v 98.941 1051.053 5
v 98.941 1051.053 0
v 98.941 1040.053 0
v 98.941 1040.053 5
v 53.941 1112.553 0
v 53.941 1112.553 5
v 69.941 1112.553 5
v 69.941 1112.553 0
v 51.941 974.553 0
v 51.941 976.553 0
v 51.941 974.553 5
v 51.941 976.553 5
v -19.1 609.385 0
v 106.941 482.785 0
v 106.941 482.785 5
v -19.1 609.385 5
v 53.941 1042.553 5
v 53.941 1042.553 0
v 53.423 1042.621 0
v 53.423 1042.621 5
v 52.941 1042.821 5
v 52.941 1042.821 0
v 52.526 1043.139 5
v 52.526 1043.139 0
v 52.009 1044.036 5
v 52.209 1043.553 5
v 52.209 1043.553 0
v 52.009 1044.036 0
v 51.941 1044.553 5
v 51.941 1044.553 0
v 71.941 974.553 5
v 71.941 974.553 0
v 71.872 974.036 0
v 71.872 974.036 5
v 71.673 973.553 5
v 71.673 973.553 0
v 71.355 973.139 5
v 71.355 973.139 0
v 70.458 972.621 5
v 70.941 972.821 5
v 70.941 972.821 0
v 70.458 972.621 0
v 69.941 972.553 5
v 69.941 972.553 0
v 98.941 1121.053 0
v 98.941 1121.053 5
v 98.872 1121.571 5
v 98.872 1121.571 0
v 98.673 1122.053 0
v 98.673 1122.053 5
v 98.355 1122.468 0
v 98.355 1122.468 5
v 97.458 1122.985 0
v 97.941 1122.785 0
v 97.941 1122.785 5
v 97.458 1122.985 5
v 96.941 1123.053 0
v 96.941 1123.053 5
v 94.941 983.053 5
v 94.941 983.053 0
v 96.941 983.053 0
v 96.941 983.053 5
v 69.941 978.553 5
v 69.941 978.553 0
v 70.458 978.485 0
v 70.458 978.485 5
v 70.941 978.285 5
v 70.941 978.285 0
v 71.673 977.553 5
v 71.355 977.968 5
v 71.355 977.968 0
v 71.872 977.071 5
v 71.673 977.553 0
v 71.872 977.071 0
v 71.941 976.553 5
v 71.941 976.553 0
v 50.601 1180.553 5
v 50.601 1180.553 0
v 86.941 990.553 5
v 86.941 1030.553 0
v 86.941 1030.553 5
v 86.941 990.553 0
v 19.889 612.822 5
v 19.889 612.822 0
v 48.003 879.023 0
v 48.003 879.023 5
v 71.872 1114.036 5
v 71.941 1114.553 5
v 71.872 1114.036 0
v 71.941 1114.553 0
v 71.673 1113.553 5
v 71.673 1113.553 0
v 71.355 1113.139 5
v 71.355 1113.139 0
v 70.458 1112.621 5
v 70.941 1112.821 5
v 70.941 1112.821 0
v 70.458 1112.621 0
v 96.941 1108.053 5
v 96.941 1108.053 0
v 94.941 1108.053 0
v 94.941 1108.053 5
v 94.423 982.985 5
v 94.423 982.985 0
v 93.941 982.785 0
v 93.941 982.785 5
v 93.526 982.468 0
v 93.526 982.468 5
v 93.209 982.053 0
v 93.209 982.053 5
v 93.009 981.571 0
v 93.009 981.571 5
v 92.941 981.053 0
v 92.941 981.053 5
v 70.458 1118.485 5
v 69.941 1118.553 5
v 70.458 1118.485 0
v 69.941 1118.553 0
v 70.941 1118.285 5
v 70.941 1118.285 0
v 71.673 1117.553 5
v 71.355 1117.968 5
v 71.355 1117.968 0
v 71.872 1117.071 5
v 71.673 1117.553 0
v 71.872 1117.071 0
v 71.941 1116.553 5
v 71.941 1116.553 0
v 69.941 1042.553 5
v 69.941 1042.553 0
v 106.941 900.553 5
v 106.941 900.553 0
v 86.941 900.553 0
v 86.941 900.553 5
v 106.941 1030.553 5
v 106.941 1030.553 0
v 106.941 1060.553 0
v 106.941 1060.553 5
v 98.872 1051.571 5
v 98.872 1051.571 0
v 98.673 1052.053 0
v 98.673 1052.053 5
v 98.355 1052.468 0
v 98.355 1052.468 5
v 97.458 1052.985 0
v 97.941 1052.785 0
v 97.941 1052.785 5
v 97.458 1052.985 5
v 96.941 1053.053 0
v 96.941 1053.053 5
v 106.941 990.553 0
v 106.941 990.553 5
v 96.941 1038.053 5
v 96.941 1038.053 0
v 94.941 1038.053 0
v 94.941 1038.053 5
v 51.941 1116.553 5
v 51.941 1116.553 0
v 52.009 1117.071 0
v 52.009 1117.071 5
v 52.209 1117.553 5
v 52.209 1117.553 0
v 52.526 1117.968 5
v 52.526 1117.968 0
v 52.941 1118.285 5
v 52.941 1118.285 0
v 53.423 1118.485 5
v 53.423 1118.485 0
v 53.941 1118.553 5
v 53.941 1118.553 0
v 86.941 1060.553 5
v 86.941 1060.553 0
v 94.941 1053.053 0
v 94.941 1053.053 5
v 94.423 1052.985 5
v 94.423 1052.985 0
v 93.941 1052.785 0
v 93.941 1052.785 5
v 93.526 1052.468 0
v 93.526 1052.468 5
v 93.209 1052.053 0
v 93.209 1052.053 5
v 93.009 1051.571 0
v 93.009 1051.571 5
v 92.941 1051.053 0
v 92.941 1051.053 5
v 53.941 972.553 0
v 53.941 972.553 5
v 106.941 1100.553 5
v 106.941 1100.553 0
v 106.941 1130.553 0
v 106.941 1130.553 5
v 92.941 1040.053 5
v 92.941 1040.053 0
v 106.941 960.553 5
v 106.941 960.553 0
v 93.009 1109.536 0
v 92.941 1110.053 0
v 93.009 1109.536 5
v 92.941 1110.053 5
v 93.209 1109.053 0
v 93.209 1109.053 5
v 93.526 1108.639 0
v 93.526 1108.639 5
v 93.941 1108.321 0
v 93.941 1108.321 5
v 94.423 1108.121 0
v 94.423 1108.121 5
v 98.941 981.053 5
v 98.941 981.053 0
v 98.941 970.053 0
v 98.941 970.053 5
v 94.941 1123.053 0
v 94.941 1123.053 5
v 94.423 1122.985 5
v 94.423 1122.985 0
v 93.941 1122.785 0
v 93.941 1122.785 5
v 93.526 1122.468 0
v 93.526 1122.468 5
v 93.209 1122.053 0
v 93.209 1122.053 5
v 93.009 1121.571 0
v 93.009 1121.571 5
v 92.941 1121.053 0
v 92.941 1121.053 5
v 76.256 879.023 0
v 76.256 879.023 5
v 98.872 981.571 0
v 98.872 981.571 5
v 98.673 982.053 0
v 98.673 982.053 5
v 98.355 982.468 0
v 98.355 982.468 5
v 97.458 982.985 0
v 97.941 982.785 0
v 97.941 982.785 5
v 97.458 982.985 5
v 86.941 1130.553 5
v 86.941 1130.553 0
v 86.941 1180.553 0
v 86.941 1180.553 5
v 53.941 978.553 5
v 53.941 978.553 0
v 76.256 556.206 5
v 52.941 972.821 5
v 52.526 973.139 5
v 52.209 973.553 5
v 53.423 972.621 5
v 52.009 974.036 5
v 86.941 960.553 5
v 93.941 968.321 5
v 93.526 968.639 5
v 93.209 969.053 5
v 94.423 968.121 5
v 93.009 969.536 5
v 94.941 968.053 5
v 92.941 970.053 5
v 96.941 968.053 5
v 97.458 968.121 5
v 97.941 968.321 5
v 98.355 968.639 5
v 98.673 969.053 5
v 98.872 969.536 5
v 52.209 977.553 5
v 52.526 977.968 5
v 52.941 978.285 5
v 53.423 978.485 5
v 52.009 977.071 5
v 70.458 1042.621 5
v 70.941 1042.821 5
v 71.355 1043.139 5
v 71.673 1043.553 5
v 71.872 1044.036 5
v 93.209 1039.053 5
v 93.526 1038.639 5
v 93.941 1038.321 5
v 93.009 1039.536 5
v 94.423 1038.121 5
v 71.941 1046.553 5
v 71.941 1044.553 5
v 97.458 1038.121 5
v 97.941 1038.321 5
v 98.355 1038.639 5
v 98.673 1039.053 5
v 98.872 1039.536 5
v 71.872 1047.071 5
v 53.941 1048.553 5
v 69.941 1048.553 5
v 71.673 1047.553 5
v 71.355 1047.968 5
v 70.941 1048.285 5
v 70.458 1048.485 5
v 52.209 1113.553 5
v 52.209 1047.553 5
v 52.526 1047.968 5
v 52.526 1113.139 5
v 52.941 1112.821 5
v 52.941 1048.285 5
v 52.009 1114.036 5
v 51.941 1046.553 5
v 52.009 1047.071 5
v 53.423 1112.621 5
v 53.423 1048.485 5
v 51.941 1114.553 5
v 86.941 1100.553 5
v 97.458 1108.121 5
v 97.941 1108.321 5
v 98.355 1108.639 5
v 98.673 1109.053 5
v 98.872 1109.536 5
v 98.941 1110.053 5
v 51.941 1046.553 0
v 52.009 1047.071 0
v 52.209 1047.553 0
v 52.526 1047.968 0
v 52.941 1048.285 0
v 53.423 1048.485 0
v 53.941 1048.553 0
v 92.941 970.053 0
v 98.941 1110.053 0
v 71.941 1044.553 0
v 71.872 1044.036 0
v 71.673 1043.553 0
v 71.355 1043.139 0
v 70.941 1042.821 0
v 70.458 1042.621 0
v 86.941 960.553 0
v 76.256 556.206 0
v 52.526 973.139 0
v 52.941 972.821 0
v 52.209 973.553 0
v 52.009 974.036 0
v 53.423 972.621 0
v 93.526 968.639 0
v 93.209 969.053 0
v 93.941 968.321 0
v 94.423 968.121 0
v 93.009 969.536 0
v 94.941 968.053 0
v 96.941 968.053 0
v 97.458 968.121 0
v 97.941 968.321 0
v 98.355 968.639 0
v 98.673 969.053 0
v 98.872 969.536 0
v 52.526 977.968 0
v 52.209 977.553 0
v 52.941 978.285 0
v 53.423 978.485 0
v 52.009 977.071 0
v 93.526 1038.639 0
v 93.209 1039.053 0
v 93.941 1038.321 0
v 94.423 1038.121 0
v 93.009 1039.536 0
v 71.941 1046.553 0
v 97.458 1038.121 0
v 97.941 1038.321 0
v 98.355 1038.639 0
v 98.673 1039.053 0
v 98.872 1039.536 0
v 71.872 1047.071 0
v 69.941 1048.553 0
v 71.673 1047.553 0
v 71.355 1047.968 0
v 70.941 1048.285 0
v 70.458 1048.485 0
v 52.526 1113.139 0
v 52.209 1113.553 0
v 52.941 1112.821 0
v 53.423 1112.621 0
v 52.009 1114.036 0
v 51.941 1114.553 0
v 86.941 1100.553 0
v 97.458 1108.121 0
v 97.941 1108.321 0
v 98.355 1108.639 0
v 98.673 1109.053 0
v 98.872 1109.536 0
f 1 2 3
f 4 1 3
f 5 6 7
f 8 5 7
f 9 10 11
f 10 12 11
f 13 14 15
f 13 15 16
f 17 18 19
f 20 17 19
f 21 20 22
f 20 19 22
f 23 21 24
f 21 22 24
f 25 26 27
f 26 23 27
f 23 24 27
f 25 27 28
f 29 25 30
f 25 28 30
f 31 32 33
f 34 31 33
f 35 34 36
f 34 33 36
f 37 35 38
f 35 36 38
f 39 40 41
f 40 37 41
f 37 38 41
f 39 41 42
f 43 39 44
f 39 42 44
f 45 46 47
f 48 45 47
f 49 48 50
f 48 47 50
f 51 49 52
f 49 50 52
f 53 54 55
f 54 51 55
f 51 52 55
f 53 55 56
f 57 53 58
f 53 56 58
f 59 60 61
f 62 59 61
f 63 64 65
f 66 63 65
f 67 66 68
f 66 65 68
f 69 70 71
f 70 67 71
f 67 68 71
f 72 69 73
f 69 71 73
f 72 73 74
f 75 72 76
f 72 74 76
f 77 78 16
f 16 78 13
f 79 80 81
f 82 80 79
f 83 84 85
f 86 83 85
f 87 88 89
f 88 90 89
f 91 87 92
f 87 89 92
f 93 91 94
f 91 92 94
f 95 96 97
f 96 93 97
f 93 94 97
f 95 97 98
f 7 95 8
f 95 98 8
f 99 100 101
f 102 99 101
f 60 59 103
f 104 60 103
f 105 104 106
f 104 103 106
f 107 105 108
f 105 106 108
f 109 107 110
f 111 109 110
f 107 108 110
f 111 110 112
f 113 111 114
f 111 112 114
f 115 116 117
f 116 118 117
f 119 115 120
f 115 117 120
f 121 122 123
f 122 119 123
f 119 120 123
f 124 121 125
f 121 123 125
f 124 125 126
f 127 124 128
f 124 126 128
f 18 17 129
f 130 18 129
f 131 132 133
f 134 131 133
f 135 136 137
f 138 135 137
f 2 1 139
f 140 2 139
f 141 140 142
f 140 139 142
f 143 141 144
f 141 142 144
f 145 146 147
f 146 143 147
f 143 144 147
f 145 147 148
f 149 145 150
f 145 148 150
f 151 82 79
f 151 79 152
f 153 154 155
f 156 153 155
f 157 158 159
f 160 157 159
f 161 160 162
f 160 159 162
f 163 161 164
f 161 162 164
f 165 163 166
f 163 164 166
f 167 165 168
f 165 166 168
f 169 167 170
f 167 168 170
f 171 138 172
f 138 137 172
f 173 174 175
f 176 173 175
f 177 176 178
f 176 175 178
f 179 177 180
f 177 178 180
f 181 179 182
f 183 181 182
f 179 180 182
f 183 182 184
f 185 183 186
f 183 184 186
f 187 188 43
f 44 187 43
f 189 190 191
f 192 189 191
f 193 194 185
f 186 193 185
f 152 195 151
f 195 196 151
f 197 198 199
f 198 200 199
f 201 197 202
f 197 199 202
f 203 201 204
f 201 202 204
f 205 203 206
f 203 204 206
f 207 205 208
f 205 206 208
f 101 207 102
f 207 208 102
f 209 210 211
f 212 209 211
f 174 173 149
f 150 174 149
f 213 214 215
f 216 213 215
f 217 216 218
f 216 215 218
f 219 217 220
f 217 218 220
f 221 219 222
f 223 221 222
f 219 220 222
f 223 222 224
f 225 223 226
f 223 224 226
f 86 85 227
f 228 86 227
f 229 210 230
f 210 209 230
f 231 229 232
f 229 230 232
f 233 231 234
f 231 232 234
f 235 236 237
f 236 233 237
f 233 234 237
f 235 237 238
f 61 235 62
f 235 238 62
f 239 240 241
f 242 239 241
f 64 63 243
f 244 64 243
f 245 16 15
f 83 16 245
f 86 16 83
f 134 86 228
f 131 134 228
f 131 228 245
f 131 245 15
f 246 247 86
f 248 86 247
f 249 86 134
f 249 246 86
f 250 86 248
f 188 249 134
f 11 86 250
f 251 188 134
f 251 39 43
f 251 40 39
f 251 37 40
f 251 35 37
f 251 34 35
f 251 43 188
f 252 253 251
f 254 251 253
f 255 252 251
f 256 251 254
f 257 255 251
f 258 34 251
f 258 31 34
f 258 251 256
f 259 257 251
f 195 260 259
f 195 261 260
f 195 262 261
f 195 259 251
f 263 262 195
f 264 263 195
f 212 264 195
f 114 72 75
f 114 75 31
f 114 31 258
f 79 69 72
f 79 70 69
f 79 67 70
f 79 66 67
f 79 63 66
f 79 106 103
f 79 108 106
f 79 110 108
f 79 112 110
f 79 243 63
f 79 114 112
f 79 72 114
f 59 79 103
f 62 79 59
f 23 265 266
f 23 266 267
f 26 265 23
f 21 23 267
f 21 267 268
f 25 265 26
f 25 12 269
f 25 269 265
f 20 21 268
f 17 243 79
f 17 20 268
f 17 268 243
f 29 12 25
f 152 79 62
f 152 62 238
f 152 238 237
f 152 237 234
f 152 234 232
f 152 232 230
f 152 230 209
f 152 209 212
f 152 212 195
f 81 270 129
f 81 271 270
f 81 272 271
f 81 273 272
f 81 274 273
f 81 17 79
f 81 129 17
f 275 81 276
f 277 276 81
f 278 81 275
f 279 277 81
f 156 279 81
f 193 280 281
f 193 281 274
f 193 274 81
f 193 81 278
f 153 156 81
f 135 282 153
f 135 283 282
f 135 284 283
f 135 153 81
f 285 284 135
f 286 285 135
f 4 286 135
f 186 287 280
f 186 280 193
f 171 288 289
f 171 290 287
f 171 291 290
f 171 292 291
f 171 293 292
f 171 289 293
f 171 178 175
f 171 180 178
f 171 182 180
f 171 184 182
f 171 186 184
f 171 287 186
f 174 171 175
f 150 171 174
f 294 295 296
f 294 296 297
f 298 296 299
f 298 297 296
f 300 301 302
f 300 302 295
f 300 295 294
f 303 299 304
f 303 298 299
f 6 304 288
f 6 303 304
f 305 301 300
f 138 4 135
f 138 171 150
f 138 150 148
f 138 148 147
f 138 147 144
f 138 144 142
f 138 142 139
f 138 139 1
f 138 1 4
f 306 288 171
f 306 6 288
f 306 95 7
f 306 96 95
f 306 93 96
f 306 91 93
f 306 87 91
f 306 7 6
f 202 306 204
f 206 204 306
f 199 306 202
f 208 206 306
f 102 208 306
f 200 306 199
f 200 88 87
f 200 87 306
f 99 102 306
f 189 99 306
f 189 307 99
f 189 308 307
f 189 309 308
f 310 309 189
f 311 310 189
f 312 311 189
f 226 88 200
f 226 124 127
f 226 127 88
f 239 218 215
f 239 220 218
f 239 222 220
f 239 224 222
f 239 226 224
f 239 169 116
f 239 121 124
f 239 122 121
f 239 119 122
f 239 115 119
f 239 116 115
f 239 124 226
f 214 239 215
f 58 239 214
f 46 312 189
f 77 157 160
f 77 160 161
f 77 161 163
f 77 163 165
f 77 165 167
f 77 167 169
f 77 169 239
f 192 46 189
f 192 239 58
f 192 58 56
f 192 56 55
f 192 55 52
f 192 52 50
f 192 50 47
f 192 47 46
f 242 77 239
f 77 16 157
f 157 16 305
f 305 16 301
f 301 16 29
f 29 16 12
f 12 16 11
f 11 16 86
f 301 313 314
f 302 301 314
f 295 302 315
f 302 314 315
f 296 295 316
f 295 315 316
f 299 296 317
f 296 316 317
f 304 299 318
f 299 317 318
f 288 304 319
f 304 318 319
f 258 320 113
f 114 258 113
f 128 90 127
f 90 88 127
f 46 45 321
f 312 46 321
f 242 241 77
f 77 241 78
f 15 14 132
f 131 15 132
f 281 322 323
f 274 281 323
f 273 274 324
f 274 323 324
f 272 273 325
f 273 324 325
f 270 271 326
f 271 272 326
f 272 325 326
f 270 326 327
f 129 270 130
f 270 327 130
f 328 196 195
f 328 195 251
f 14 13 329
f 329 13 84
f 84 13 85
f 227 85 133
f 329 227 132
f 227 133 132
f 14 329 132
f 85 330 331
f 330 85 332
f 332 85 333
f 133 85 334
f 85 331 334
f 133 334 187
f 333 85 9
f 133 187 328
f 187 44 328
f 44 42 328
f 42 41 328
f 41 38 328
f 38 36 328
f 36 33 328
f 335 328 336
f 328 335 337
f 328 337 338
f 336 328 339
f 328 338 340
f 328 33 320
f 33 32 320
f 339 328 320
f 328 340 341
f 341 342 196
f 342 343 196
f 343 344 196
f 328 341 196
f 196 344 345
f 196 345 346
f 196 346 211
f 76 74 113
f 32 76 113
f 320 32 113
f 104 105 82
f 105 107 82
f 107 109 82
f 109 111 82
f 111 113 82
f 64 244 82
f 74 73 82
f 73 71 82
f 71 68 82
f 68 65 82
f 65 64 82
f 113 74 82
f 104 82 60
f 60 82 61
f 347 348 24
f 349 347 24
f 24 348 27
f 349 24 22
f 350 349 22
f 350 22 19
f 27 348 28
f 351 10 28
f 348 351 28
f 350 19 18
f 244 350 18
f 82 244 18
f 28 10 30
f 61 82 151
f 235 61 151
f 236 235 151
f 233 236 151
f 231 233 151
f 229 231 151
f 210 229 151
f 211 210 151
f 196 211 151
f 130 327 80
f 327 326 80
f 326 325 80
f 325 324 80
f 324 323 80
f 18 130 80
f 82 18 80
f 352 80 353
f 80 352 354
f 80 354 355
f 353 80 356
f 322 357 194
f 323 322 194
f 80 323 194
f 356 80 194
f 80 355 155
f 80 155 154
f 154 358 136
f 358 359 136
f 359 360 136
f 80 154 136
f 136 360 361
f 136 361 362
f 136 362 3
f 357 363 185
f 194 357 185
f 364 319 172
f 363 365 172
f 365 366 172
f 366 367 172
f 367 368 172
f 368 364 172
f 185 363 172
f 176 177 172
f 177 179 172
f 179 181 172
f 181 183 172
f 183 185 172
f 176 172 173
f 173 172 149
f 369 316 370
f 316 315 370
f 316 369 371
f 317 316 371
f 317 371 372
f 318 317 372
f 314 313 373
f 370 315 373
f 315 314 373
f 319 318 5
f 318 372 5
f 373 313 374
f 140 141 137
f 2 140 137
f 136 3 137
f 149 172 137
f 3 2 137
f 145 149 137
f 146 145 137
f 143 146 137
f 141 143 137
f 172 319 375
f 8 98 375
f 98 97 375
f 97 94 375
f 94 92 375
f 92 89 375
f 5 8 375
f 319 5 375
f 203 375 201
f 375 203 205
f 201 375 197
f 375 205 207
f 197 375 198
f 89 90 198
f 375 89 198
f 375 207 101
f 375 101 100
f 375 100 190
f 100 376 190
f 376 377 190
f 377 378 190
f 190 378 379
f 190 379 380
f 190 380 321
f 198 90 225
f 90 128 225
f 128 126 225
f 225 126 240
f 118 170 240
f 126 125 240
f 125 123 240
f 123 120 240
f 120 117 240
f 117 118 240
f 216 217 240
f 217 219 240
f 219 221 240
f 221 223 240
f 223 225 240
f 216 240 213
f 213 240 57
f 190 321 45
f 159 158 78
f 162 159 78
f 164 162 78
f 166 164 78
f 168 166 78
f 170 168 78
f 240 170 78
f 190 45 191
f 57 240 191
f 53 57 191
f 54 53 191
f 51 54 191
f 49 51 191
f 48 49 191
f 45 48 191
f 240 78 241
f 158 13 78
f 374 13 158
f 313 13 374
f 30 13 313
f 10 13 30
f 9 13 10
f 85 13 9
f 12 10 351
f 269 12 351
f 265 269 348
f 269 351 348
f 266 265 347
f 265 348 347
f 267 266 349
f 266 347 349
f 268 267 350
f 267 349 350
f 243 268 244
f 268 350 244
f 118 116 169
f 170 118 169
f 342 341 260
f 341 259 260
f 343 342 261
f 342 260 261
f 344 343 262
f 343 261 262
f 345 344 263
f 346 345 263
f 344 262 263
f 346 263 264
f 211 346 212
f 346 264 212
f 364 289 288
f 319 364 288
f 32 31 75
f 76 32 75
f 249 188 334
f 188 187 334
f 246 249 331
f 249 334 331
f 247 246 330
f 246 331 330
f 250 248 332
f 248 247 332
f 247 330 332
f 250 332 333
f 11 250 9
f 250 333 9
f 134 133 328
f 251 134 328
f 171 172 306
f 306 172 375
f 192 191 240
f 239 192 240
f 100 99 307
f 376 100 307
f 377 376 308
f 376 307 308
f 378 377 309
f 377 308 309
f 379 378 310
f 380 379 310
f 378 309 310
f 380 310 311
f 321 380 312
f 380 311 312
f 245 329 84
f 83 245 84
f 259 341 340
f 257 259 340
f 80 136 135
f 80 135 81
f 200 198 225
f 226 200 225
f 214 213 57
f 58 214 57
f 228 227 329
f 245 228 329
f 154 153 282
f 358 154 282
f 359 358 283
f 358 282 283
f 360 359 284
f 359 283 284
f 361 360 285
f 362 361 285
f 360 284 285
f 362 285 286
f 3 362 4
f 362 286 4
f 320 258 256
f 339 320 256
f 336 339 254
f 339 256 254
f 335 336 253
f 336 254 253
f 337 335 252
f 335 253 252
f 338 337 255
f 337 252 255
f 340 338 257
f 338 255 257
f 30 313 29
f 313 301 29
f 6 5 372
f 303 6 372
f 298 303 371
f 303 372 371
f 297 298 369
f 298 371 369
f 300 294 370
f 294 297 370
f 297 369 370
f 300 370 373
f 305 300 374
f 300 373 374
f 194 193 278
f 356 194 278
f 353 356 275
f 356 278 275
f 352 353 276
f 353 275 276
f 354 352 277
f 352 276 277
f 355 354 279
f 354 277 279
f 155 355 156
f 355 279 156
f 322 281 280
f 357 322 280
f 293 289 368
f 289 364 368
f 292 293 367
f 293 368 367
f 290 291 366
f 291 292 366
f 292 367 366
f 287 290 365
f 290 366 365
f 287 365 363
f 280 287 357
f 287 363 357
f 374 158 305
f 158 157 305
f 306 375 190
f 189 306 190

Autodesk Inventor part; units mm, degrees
ref_plane "YZ Plane" through (0, 0, 0) normal (1, 0, 0) x (0, 1, 0)
ref_plane "XZ Plane" through (0, 0, 0) normal (0, 1, 0) x (-1, 0, 0)
ref_plane "XY Plane" through (0, 0, 0) normal (0, 0, 1) x (1, 0, 0)
sketch "Szkic1" plane through (0, 0, 0) normal (0, 0, 1) x (1, 0, 0)
  line L0 (176.3308, 486.6406) -> (176.3308, 940.0878) construction
  line L1 (146.3308, 1046.0878) -> (146.3308, 531.0878) construction
  line L2 (246.3308, 494.0715) -> (246.3308, 1046.1041) construction
  line L3 (-96.6896, 915.5533) -> (106.9406, 915.5533) construction
  line L4 (106.9406, 482.7854) -> (106.9406, 1180.5533)
  line L5 (106.9406, 482.7854) -> (-19.1, 609.3854)
  line L6 (50.6014, 1180.5533) -> (-19.1, 609.3854)
  line L7 (19.8894, 612.8224) -> (76.2561, 1146.5389)
  line L8 (76.2561, 1146.5389) -> (76.2561, 556.2056)
  line L9 (43.2451, 833.9694) -> (8.8194, 838.1705) construction
  line L10 (76.2561, 556.2056) -> (54.9566, 535.0002) construction
  line L11 (76.2561, 613.2072) -> (106.9406, 613.2072) construction
  line L12 (76.2561, 556.2056) -> (19.8894, 612.8224)
  line L13 (14.654, 575.0721) -> (120.72, 469.0061) construction
  line L14 (10.3406, 579.3854) -> (14.654, 575.0721) construction
  line L15 (-19.1, 622) -> (-19.1, 0) construction
  line L16 (-8.2, 622) -> (-16.1, 622) construction
  line L17 (-6.6931, 622) -> (-1.5069, 622) construction
  line L18 (-19.1, 622) -> (-16.1, 622) construction
  line L19 (7.9, 622) -> (0, 622) construction
  line L20 (10.9, 621.8118) -> (36.4266, 596.2853) construction
  line L21 (36.4266, 596.2853) -> (142.1601, 489.8877) construction
  line L22 (48.0033, 879.023) -> (76.2561, 879.023)
  line L23 (91.9406, 1180.5533) -> (424.3104, 1180.5533) construction
  line L24 (106.9406, 915.5533) -> (383.3104, 915.5533) construction
  line L25 (91.9406, 1180.5533) -> (50.6014, 1180.5533)
  line L26 (106.9406, 1180.5533) -> (50.6014, 1180.5533)
  point P0 (0, 0)
  dimension "d0" = 30
  dimension "d1" = 100
ref_plane "Płaszczyzna konstrukcyjna1" through (0, 0, 5) normal (0, 0, 1) x (1, 0, 0)
extrude "Wyciągnięcie proste4" add sketch "Szkic1" along normal blind 5 contours L5 L6 L25 L26 L4 | L7 L8 L22
sketch "Szkic3" plane through (0, 0, 0) normal (0, 0, -1) x (-1, 0, 0)
  line L0 (-48.0033, 879.023) -> (-19.8894, 612.8224) projected
  line L1 (-19.8894, 612.8224) -> (-76.2561, 556.2056) projected
  line L2 (-76.2561, 556.2056) -> (-76.2561, 879.023) projected
  line L3 (-76.2561, 879.023) -> (-48.0033, 879.023) projected
  line L4 (-106.9406, 1180.5533) -> (-106.9406, 482.7854) projected
  line L5 (-106.9406, 482.7854) -> (19.1, 609.3854) projected
  line L6 (19.1, 609.3854) -> (-50.6014, 1180.5533) projected
  line L7 (-50.6014, 1180.5533) -> (-106.9406, 1180.5533) construction
  line L8 (-106.9406, 482.7854) -> (-106.9406, 1180.5533) projected
  line L9 (-106.9406, 1060.5533) -> (-86.9406, 1060.5533)
  line L10 (-86.9406, 1060.5533) -> (-86.9406, 1100.5533)
  line L11 (-86.9406, 1100.5533) -> (-106.9406, 1100.5533)
  line L12 (-106.9406, 1100.5533) -> (-106.9406, 1060.5533)
  line L13 (-106.9406, 1130.5533) -> (-86.9406, 1130.5533)
  line L14 (-86.9406, 1130.5533) -> (-86.9406, 1180.5533)
  line L15 (-86.9406, 1180.5533) -> (-106.9406, 1180.5533)
  line L16 (-106.9406, 1180.5533) -> (-106.9406, 1130.5533)
  line L17 (-106.9406, 1030.5533) -> (-86.9406, 1030.5533)
  line L18 (-86.9406, 1030.5533) -> (-86.9406, 990.5533)
  line L19 (-86.9406, 990.5533) -> (-106.9406, 990.5533)
  line L20 (-106.9406, 990.5533) -> (-106.9406, 1030.5533)
  line L21 (-226, 915.5533) -> (53, 915.5533) construction
  line L22 (-86.9406, 990.5533) -> (-106.9406, 990.5533)
  line L23 (-106.9406, 990.5533) -> (-106.9406, 960.5533)
  line L24 (-106.9406, 960.5533) -> (-86.9406, 960.5533)
  line L25 (-86.9406, 960.5533) -> (-106.9406, 960.5533)
  line L26 (-106.9406, 960.5533) -> (-106.9406, 900.5533)
  line L27 (-106.9406, 900.5533) -> (-86.9406, 900.5533)
  line L28 (-86.9406, 900.5533) -> (-86.9406, 960.5533)
  line L29 (-98.9406, 968.0533) -> (-92.9406, 968.0533)
  line L30 (-92.9406, 968.0533) -> (-92.9406, 983.0533)
  line L31 (-92.9406, 983.0533) -> (-98.9406, 983.0533)
  line L32 (-98.9406, 983.0533) -> (-98.9406, 968.0533)
  line L33 (-98.9406, 1038.0533) -> (-92.9406, 1038.0533)
  line L34 (-92.9406, 1038.0533) -> (-92.9406, 1053.0533)
  line L35 (-92.9406, 1053.0533) -> (-98.9406, 1053.0533)
  line L36 (-98.9406, 1053.0533) -> (-98.9406, 1038.0533)
  line L37 (-98.9406, 1108.0533) -> (-92.9406, 1108.0533)
  line L38 (-92.9406, 1108.0533) -> (-92.9406, 1123.0533)
  line L39 (-92.9406, 1123.0533) -> (-98.9406, 1123.0533)
  line L40 (-98.9406, 1123.0533) -> (-98.9406, 1108.0533)
  point P0 (0, 0)
  dimension "d28" = 265
  dimension "d30" = 30
  dimension "d31" = 30
  dimension "d32" = 40
  dimension "d33" = 40
  dimension "d34" = 30
  dimension "d38" = 20
  dimension "d39" = 6
  dimension "d40" = 15
  dimension "d41" = 6
  dimension "d42" = 15
  dimension "d43" = 6
  dimension "d44" = 15
  dimension "d45" = 7.5
  dimension "d46" = 7.5
  dimension "d47" = 7.5
  dimension "d48" = 8
  dimension "d49" = 8
  dimension "d64" = 50
extrude "Wyciągnięcie proste5" cut sketch "Szkic3" against normal blind 5 contours L15 L14 L13 L4 | L24 L28 L27 L4 | L17 L18 L19 L4 | L11 L10 L9 L4 | L32 L31 L30 L29 | L36 L35 L34 L33 | L40 L39 L38 L37
fillet "Zaokrąglenie1" radius 2 12 edges at (98.9406, 968.0533, 2.5) (92.9406, 968.0533, 2.5) (92.9406, 983.0533, 2.5) (98.9406, 983.0533, 2.5) (98.9406, 1053.0533, 2.5) (98.9406, 1038.0533, 2.5) (92.9406, 1038.0533, 2.5) (92.9406, 1053.0533, 2.5) (92.9406, 1123.0533, 2.5) (92.9406, 1108.0533, 2.5) (98.9406, 1108.0533, 2.5) (98.9406, 1123.0533, 2.5)
sketch "Szkic4" plane through (0, 0, 5) normal (0, 0, 1) x (1, 0, 0)
  line L0 (19.8894, 612.8224) -> (48.0033, 879.023) projected
  line L1 (48.0033, 879.023) -> (76.2561, 879.023) projected
  line L2 (76.2561, 879.023) -> (76.2561, 556.2056) projected
  line L3 (76.2561, 556.2056) -> (19.8894, 612.8224) projected
  line L4 (92.9406, 1110.0533) -> (92.9406, 1121.0533) projected
  arc A0 (94.9406, 1123.0533) -> (92.9406, 1121.0533) centre (94.9406, 1121.0533) ccw projected
  line L5 (94.9406, 1123.0533) -> (96.9406, 1123.0533) projected
  arc A1 (98.9406, 1121.0533) -> (96.9406, 1123.0533) centre (96.9406, 1121.0533) ccw projected
  line L6 (98.9406, 1121.0533) -> (98.9406, 1110.0533) projected
  arc A2 (96.9406, 1108.0533) -> (98.9406, 1110.0533) centre (96.9406, 1110.0533) ccw projected
  line L7 (96.9406, 1108.0533) -> (94.9406, 1108.0533) projected
  arc A3 (92.9406, 1110.0533) -> (94.9406, 1108.0533) centre (94.9406, 1110.0533) ccw projected
  line L8 (92.9406, 970.0533) -> (92.9406, 981.0533) projected
  arc A4 (94.9406, 983.0533) -> (92.9406, 981.0533) centre (94.9406, 981.0533) ccw projected
  line L9 (94.9406, 983.0533) -> (96.9406, 983.0533) projected
  arc A5 (98.9406, 981.0533) -> (96.9406, 983.0533) centre (96.9406, 981.0533) ccw projected
  line L10 (98.9406, 981.0533) -> (98.9406, 970.0533) projected
  arc A6 (96.9406, 968.0533) -> (98.9406, 970.0533) centre (96.9406, 970.0533) ccw projected
  line L11 (96.9406, 968.0533) -> (94.9406, 968.0533) projected
  arc A7 (92.9406, 970.0533) -> (94.9406, 968.0533) centre (94.9406, 970.0533) ccw projected
  line L12 (92.9406, 1040.0533) -> (92.9406, 1051.0533) projected
  arc A8 (94.9406, 1053.0533) -> (92.9406, 1051.0533) centre (94.9406, 1051.0533) ccw projected
  line L13 (94.9406, 1053.0533) -> (96.9406, 1053.0533) projected
  arc A9 (98.9406, 1051.0533) -> (96.9406, 1053.0533) centre (96.9406, 1051.0533) ccw projected
  line L14 (98.9406, 1051.0533) -> (98.9406, 1040.0533) projected
  arc A10 (96.9406, 1038.0533) -> (98.9406, 1040.0533) centre (96.9406, 1040.0533) ccw projected
  line L15 (96.9406, 1038.0533) -> (94.9406, 1038.0533) projected
  arc A11 (92.9406, 1040.0533) -> (94.9406, 1038.0533) centre (94.9406, 1040.0533) ccw projected
  line L16 (106.9406, 990.5533) -> (86.9406, 990.5533) projected
  line L17 (86.9406, 990.5533) -> (86.9406, 1030.5533) projected
  line L18 (86.9406, 1030.5533) -> (106.9406, 1030.5533) projected
  line L19 (106.9406, 1030.5533) -> (106.9406, 1060.5533) projected
  line L20 (106.9406, 1060.5533) -> (86.9406, 1060.5533) projected
  line L21 (86.9406, 1060.5533) -> (86.9406, 1100.5533) projected
  line L22 (86.9406, 1100.5533) -> (106.9406, 1100.5533) projected
  line L23 (106.9406, 1100.5533) -> (106.9406, 1130.5533) projected
  line L24 (106.9406, 1130.5533) -> (86.9406, 1130.5533) projected
  line L25 (86.9406, 1130.5533) -> (86.9406, 1180.5533) projected
  line L26 (86.9406, 1180.5533) -> (50.6014, 1180.5533) projected
  line L27 (50.6014, 1180.5533) -> (-19.1, 609.3854) projected
  line L28 (-19.1, 609.3854) -> (106.9406, 482.7854) projected
  line L29 (106.9406, 482.7854) -> (106.9406, 900.5533) projected
  line L30 (106.9406, 900.5533) -> (86.9406, 900.5533) projected
  line L31 (86.9406, 900.5533) -> (86.9406, 960.5533) projected
  line L32 (86.9406, 960.5533) -> (106.9406, 960.5533) projected
  line L33 (106.9406, 960.5533) -> (106.9406, 990.5533) projected
  line L34 (51.9406, 972.5533) -> (71.9406, 972.5533)
  line L35 (71.9406, 972.5533) -> (71.9406, 978.5533)
  line L36 (71.9406, 978.5533) -> (51.9406, 978.5533)
  line L37 (51.9406, 978.5533) -> (51.9406, 972.5533)
  line L38 (51.9406, 1042.5533) -> (71.9406, 1042.5533)
  line L39 (71.9406, 1042.5533) -> (71.9406, 1048.5533)
  line L40 (71.9406, 1048.5533) -> (51.9406, 1048.5533)
  line L41 (51.9406, 1048.5533) -> (51.9406, 1042.5533)
  line L42 (51.9406, 1112.5533) -> (71.9406, 1112.5533)
  line L43 (71.9406, 1112.5533) -> (71.9406, 1118.5533)
  line L44 (71.9406, 1118.5533) -> (51.9406, 1118.5533)
  line L45 (51.9406, 1118.5533) -> (51.9406, 1112.5533)
  point P0 (0, 0)
  dimension "d51" = 20
  dimension "d52" = 6
  dimension "d53" = 20
  dimension "d54" = 6
  dimension "d55" = 20
  dimension "d56" = 6
  dimension "d57" = 64
  dimension "d58" = 64
  dimension "d59" = 12
  dimension "d60" = 15
extrude "Wyciągnięcie proste6" cut sketch "Szkic4" against normal blind 5 contours L37 L36 L35 L34 | L41 L40 L39 L38 | L45 L44 L43 L42
fillet "Zaokrąglenie2" radius 2 12 edges at (51.9406, 972.5533, 2.5) (71.9406, 972.5533, 2.5) (71.9406, 978.5533, 2.5) (51.9406, 978.5533, 2.5) (51.9406, 1048.5533, 2.5) (51.9406, 1042.5533, 2.5) (71.9406, 1042.5533, 2.5) (71.9406, 1048.5533, 2.5) (71.9406, 1118.5533, 2.5) (51.9406, 1118.5533, 2.5) (71.9406, 1112.5533, 2.5) (51.9406, 1112.5533, 2.5)
equation "\"d30\" = d34"
equation "\"d31\" = d34"
equation "\"d32\" = d33"
equation "\"d39\" = d43"
equation "\"d40\" = d44"
equation "\"d41\" = d43"
equation "\"d42\" = d40"
equation "\"d46\" = d45"
equation "\"d47\" = d46"
equation "\"d49\" = d48"
equation "\"d53\" = d51"
equation "\"d55\" = d51"
equation "\"d58\" = d57"
properties part number "bok"
